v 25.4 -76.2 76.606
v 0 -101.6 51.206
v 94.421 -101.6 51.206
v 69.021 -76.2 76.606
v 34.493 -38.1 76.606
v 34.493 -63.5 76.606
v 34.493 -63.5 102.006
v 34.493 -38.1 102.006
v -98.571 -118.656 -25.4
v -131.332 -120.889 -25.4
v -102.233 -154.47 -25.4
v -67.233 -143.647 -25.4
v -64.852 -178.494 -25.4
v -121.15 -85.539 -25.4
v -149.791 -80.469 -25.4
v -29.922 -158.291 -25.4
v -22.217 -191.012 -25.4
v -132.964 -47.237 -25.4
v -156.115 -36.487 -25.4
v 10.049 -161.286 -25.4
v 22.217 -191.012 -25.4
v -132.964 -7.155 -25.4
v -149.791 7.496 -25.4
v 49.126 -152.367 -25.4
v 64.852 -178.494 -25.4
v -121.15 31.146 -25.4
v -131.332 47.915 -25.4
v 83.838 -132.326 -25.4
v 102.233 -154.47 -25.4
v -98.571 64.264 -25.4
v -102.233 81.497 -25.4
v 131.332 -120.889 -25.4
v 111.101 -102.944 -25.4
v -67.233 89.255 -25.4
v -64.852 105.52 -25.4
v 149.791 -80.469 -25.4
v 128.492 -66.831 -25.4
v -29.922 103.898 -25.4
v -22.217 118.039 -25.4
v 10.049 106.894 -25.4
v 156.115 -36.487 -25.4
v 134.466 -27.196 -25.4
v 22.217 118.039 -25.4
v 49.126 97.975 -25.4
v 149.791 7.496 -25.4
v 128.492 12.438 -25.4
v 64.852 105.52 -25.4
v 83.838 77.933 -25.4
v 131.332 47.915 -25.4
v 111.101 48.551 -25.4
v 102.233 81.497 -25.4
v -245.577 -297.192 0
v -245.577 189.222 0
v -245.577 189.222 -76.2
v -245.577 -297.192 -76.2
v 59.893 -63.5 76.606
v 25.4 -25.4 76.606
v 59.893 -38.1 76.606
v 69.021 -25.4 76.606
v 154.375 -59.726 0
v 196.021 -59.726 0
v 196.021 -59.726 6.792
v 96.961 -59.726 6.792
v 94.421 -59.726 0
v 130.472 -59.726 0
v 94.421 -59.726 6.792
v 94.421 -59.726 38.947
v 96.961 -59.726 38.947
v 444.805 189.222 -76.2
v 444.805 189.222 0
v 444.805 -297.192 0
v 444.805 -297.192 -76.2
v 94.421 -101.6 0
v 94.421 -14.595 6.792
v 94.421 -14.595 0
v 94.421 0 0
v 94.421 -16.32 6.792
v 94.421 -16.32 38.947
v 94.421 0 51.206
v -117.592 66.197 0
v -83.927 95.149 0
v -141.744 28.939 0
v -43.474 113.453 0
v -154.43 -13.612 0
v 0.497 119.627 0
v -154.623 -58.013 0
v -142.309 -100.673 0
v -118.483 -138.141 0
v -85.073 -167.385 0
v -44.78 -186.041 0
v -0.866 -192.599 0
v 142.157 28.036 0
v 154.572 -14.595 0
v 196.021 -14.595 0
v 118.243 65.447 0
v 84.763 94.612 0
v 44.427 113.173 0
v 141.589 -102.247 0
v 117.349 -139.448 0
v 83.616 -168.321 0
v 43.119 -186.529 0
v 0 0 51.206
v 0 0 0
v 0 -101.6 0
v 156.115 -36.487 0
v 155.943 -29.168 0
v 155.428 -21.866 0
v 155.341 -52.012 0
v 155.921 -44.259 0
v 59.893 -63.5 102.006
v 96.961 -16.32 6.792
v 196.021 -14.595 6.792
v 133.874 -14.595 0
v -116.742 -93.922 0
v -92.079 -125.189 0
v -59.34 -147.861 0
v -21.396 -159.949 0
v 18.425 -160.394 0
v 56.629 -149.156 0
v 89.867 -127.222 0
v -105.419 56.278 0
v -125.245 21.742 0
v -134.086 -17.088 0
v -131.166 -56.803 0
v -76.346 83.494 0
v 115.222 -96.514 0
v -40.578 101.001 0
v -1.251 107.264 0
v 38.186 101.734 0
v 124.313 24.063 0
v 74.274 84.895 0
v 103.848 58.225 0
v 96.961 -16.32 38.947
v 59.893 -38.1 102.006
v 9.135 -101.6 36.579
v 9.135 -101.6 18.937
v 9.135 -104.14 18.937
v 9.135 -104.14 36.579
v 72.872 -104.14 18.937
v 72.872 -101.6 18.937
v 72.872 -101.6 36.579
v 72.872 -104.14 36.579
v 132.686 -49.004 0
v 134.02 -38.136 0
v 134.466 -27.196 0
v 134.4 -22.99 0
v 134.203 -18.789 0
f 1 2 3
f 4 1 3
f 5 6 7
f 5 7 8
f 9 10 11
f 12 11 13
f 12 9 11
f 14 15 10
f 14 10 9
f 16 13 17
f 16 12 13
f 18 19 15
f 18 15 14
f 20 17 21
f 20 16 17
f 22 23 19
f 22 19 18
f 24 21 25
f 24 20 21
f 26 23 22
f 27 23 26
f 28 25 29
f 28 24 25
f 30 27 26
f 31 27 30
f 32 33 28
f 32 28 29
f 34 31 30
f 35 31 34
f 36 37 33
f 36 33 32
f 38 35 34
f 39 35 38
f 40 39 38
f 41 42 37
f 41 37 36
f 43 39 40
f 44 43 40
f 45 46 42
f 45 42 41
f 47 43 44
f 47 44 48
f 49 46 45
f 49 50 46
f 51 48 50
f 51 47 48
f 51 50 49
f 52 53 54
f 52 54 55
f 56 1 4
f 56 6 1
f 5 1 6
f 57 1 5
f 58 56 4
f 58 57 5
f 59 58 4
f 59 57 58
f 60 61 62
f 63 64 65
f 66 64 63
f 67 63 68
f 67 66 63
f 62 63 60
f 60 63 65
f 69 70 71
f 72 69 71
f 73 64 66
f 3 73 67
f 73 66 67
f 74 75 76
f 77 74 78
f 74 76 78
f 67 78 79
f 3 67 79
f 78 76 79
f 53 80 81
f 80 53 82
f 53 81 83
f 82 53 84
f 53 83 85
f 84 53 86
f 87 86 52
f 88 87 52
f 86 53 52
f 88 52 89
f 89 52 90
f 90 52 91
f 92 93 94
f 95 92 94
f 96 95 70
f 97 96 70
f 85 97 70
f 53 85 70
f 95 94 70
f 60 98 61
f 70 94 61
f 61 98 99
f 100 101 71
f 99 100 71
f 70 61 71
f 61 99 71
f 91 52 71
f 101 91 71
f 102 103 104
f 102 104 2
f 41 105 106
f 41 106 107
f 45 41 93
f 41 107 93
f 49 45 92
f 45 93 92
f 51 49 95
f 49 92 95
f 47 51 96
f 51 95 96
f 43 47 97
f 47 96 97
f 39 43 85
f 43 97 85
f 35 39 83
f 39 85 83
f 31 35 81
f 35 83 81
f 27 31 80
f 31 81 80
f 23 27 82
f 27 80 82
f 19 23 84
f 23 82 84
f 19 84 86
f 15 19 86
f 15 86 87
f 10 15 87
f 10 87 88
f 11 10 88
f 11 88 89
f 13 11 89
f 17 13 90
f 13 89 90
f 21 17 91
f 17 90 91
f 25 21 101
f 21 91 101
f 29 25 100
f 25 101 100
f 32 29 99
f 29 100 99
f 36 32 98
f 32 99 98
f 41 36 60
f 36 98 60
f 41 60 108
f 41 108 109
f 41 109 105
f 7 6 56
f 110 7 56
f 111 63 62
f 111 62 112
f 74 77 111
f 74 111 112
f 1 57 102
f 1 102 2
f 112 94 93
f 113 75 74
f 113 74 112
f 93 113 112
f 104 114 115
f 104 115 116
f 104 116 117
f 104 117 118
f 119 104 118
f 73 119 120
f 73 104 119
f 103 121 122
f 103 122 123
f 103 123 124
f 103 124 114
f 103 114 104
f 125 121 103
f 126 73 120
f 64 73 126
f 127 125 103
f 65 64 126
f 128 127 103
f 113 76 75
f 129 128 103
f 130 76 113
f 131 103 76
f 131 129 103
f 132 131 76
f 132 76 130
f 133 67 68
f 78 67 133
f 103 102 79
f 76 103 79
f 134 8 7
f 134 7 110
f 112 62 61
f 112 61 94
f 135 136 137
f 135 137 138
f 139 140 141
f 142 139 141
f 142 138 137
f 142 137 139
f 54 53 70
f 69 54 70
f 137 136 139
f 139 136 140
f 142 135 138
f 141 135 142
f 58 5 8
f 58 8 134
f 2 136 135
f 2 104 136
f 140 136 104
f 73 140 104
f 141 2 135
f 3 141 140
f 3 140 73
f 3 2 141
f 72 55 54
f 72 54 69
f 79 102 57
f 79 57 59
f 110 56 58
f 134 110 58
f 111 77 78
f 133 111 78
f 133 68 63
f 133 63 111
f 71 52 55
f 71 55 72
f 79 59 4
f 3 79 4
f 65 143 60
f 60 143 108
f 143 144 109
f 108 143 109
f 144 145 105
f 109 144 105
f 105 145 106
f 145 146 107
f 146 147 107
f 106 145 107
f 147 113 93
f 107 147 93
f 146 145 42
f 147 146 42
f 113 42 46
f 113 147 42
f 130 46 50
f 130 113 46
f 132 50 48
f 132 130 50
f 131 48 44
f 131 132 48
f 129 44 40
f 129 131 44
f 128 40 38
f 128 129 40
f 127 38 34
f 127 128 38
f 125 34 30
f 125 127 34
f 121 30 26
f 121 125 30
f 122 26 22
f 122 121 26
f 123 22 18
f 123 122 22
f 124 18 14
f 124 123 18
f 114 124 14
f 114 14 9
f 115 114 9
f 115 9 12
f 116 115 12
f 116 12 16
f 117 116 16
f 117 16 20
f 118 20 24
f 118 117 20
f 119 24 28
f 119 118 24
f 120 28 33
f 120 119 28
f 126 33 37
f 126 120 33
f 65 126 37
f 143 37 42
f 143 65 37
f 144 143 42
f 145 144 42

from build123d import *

# Parameters (mm, degrees)
F0_W      = 94.4209545851
F0_H      = 76.6059160233
F1_DEPTH  = 101.6
F2_SIZE   = 25.4
F3_W      = 25.4
F3_H      = 25.4
F4_DEPTH  = 25.4
F6_W      = 45.1313219965
F6_H      = 6.7916600965
F7_DEPTH  = 101.6
F5_W      = 63.737494871
F5_H      = 17.642442137
F8_DEPTH  = 2.54
F9_W      = 43.406561017
F9_H      = 32.155352179
F10_DEPTH = 2.54
F11_W     = 690.3821974993
F11_H     = 486.4143431187
F12_DEPTH = 76.2
F14_R     = 156.1146532665
F15_DEPTH = 25.4
F16_R     = 134.4660155787
F17_DEPTH = 25.4


with BuildPart() as f1:
    # F0 (on Front) → F1 (new body)
    with BuildSketch(Plane.XZ):
        with Locations((47.2104772925, 38.3029580116)):
            Rectangle(F0_W, F0_H)
    extrude(amount=F1_DEPTH)

    # F2
    f2_edges = [f1.edges().sort_by_distance(p)[0] for p in [
        (94.420955, -50.8, 76.605916),
        (0, -50.8, 76.605916),
        (47.210477, 0, 76.605916),
        (47.210477, -101.6, 76.605916),
    ]]
    chamfer(f2_edges, length=F2_SIZE)

    # F3 (on face) → F4 (join)
    with BuildSketch(Plane.XY.offset(76.6059160233)):
        with Locations((47.1932, -50.8)):
            Rectangle(F3_W, F3_H)
    extrude(amount=F4_DEPTH)

    # F6 (on face) → F7 (join)
    with BuildSketch(Plane.YZ.offset(94.4209545851)):
        with Locations((-37.1608156711, 3.3958300482)):
            Rectangle(F6_W, F6_H)
    extrude(amount=F7_DEPTH)

    # F5 (on face) → F8 (join)
    with BuildSketch(Plane.XZ.offset(101.6)):
        with Locations((41.0035112873, 27.7578178793)):
            Rectangle(F5_W, F5_H)
    extrude(amount=F8_DEPTH)

    # F9 (on face) → F10 (join)
    with BuildSketch(Plane.YZ.offset(94.4209545851)):
        with Locations((-38.0231961608, 22.869336186)):
            Rectangle(F9_W, F9_H)
    extrude(amount=F10_DEPTH)

    # F11 (on face) → F12 (join)
    with BuildSketch(Plane(origin=(0, 0, 0), x_dir=(1, 0, 0), z_dir=(0, 0, -1))):
        with Locations((99.6137782931, 53.9849847555)):
            Rectangle(F11_W, F11_H)
        Polygon((0, 0), (0, 101.6), (94.4209545851, 101.6), (94.4209545851, 59.7264766693), (196.0209545851, 59.7264766693), (196.0209545851, 14.5951546729), (94.4209545851, 14.5951546729), (94.4209545851, 0), align=None, mode=Mode.SUBTRACT)
        Polygon((94.4209545851, 101.6), (0, 101.6), (0, 0), (94.4209545851, 0), (94.4209545851, 14.5951546729), (196.0209545851, 14.5951546729), (196.0209545851, 59.7264766693), (94.4209545851, 59.7264766693), align=None)
    extrude(amount=F12_DEPTH)

    # F14 (on face) → F15 (cut)
    with BuildSketch(Plane.XY):
        with Locations((0, -36.4867895842)):
            Circle(F14_R)
    extrude(amount=-F15_DEPTH, mode=Mode.SUBTRACT)

    # F16 (on face) → F17 (join, through all)
    with BuildSketch(Plane.XY):
        with Locations((0, -27.1963328123)):
            Circle(F16_R)
    extrude(amount=-F17_DEPTH)


solid = f1.part
